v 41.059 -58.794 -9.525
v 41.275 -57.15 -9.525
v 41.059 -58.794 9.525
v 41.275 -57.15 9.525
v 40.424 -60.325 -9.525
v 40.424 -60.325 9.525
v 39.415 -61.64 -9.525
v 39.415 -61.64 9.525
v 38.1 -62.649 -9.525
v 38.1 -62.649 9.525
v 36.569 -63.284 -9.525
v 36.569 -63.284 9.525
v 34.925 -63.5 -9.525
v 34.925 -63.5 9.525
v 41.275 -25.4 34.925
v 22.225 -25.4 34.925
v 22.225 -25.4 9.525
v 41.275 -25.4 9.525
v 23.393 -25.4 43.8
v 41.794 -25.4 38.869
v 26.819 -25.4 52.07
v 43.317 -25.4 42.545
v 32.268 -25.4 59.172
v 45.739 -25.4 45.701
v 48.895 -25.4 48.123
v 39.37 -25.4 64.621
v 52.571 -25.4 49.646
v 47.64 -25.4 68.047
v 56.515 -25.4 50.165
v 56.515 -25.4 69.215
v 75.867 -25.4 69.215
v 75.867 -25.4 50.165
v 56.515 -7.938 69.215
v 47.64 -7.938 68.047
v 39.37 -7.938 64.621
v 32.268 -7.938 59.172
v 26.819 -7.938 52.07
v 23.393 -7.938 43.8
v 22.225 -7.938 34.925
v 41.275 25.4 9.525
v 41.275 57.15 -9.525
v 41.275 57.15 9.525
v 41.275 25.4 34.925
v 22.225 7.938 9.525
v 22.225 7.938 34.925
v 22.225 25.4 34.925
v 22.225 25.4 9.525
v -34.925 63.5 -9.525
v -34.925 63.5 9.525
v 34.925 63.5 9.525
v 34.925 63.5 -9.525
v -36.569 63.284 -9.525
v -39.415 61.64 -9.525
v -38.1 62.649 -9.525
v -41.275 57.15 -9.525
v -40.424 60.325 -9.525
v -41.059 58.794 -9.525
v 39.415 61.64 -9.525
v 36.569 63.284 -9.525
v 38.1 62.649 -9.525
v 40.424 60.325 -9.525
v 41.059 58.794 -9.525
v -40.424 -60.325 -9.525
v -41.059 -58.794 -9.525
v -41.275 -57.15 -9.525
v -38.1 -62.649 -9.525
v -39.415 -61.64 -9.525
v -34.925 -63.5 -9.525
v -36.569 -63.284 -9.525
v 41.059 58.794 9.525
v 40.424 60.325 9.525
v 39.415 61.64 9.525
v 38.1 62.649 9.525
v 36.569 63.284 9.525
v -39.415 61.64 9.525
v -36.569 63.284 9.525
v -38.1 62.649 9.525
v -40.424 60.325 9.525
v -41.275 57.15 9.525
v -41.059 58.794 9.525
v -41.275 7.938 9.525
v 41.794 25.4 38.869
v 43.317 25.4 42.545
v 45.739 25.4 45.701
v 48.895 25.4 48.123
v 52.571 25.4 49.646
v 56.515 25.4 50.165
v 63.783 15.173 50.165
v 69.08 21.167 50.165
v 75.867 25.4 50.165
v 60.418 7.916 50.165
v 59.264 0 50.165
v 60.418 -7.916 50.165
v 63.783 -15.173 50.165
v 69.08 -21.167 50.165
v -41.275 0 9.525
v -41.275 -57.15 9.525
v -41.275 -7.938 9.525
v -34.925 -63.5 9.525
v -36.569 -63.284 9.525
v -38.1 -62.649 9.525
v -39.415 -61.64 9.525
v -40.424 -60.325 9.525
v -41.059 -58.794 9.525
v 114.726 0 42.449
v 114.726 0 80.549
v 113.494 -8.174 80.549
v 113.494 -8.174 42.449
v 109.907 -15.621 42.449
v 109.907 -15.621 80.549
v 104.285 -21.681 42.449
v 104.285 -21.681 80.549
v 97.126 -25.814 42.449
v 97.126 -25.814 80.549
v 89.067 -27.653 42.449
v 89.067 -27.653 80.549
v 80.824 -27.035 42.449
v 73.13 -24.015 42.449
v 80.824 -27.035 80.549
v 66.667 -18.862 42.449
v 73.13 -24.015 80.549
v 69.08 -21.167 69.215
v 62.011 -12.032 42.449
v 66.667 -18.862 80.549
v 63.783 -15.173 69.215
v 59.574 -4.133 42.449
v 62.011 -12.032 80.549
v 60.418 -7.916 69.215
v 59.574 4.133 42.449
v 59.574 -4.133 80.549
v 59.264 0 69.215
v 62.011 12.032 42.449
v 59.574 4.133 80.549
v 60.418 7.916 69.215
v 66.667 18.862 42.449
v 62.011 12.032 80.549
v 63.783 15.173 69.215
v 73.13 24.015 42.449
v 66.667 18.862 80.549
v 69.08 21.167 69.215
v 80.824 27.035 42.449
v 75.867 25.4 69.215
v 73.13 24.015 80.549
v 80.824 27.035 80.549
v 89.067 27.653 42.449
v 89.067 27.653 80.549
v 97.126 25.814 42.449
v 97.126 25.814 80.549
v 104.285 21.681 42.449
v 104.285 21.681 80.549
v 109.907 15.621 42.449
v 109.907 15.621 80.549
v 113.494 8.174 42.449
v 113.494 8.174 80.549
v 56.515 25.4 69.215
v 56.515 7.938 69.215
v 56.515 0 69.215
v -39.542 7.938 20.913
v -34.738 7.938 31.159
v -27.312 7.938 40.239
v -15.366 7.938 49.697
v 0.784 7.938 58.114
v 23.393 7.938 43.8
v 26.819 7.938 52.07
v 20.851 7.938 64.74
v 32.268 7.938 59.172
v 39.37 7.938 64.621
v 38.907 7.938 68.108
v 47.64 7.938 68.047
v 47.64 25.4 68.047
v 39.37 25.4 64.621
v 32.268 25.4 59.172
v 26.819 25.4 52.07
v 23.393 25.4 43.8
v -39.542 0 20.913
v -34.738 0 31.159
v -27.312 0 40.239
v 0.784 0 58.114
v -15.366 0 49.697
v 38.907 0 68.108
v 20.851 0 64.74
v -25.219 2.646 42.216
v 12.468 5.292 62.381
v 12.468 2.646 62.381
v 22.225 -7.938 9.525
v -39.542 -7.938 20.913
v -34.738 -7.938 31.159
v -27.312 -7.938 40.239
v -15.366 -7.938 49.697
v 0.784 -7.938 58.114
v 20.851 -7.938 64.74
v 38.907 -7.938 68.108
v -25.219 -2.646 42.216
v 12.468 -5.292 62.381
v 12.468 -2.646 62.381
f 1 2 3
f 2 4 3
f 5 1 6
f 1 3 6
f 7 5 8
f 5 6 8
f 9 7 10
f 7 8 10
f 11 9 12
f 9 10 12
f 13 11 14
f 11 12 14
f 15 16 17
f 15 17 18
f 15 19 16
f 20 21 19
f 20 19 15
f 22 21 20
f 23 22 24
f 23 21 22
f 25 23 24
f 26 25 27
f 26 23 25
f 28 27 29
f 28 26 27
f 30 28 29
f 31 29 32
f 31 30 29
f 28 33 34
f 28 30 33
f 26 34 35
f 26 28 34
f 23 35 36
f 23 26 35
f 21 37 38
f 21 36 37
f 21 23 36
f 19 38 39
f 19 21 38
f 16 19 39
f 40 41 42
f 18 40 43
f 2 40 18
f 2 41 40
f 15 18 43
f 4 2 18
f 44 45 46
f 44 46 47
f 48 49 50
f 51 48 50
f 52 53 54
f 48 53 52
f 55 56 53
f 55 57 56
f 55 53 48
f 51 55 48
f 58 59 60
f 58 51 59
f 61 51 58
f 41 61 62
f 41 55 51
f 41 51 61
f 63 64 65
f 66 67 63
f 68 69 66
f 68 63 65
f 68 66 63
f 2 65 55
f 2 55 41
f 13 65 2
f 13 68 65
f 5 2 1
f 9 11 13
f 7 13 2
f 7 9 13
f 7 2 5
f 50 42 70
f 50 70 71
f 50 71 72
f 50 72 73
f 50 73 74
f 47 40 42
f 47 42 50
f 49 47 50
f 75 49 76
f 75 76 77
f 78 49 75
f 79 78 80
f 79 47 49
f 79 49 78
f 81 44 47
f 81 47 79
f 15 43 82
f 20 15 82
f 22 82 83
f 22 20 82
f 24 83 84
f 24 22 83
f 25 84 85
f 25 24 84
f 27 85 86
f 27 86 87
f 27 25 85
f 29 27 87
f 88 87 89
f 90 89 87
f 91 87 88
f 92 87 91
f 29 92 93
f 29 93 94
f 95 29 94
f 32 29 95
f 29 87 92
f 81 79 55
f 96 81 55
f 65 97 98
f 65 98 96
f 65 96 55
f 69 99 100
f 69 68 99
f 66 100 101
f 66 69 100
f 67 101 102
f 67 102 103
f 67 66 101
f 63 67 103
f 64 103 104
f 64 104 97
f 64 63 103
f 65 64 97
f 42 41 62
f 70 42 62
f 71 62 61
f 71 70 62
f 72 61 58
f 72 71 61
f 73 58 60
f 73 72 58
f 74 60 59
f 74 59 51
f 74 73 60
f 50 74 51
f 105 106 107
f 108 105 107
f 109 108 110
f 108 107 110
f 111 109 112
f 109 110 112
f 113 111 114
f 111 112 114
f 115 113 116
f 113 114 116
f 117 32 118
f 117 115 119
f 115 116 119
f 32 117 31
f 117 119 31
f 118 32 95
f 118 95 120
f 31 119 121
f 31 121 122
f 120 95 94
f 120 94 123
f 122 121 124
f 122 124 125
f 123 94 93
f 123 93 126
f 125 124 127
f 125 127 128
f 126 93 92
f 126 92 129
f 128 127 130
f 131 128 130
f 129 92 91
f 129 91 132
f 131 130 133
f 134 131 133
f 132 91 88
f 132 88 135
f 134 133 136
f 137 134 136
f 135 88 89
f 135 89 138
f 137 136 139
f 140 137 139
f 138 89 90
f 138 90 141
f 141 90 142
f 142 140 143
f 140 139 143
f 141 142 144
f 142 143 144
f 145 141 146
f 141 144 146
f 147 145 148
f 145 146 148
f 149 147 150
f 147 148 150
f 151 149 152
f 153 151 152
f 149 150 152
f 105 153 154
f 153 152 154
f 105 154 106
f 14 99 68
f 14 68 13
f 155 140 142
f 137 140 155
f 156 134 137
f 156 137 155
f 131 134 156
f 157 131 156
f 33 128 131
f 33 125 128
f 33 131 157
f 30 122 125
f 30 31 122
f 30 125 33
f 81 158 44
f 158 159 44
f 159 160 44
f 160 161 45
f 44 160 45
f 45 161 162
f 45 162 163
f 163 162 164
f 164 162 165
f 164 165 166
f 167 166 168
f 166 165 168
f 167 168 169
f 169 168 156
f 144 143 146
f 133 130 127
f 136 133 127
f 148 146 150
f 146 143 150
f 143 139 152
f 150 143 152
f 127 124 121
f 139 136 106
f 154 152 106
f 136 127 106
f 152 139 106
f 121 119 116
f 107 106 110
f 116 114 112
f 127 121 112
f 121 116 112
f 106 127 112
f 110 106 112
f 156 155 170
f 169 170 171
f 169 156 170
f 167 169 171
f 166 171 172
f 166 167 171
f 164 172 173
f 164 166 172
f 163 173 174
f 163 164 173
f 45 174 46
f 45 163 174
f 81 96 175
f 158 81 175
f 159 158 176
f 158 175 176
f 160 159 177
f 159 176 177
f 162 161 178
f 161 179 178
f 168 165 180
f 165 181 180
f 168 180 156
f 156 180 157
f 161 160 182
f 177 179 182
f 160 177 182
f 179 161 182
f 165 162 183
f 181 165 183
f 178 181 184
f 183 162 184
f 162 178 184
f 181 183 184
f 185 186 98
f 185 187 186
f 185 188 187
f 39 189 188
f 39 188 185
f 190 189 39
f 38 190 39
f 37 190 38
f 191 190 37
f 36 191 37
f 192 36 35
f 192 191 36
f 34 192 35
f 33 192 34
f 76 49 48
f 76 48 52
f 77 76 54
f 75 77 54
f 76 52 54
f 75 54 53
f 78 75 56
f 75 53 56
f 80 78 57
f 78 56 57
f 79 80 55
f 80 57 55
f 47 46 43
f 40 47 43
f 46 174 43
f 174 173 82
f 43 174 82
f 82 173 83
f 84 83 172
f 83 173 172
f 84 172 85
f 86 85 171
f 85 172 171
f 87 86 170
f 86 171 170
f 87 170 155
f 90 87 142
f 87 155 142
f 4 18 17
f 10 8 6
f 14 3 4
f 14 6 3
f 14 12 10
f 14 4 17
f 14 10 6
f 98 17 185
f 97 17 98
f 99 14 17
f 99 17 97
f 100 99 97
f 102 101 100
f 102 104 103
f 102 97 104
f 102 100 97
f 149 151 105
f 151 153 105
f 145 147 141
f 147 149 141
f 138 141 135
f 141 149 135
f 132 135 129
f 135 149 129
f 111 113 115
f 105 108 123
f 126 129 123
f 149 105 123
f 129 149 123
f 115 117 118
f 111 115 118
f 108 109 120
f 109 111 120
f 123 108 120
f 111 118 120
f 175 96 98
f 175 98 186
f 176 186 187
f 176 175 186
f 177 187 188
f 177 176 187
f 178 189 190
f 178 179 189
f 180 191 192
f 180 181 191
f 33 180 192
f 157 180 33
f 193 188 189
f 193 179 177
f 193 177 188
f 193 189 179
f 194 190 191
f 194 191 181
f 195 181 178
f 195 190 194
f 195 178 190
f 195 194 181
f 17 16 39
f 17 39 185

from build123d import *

# Parameters (mm, degrees)
F1_DEPTH = 63.5
F2_DEPTH = 25.4
F3_DEPTH = 7.9375
F5_R     = 6.35


with BuildPart() as f1:
    # F0 (on Front) → F1 (new body, symmetric)
    with BuildSketch(Plane.XZ):
        Polygon((41.275, -9.525), (41.275, 9.525), (22.225, 9.525), (-41.275, 9.525), (-41.275, -9.525), align=None)
    extrude(amount=F1_DEPTH, both=True)

    # F0 (on Front) → F2 (join, symmetric)
    with BuildSketch(Plane.XZ):
        with BuildLine():
            Line((22.225, 9.525), (41.275, 9.525))
            Line((41.275, 9.525), (41.275, 34.925))
            ThreePointArc((41.275, 34.925), (45.738693, 45.701307), (56.515, 50.165))
            Line((56.515, 50.165), (76.625528, 50.165))
            Line((76.625528, 50.165), (76.625528, 69.215))
            Line((76.625528, 69.215), (56.515, 69.215))
            ThreePointArc((56.515, 69.215), (32.268308, 59.171692), (22.225, 34.925))
            Line((22.225, 34.925), (22.225, 9.525))
        make_face()
    extrude(amount=F2_DEPTH, both=True)

    # F0 (on Front) → F3 (join, symmetric)
    with BuildSketch(Plane.XZ):
        with BuildLine():
            Line((-41.275, 9.525), (22.225, 9.525))
            Line((22.225, 9.525), (22.225, 34.925))
            ThreePointArc((22.225, 34.925), (32.268308, 59.171692), (56.515, 69.215))
            add(Edge.make_bspline(
                [(-41.275, 9.525), (-41.123904, 48.20979), (14.377582, 69.315985), (56.515, 69.215)],
                knots=[0, 0, 0, 0, 114.567797, 114.567797, 114.567797, 114.567797], degree=3))
        make_face()
    extrude(amount=F3_DEPTH, both=True)

    # F0 (on Front) → F4 (revolve)
    with BuildSketch(Plane.XZ):
        Polygon((86.995, 69.215), (86.995, 50.165), (86.995, 42.44888), (114.725528, 42.44888), (114.725528, 80.54888), (86.995, 80.54888), align=None)
    revolve(axis=Axis((86.995, 0, 61.49888), (0, 0, -1)))

    # F5
    f5_edges = [f1.edges().sort_by_distance(p)[0] for p in [
        (-41.275, 63.5, 0),
        (-41.275, -63.5, 0),
        (41.275, 63.5, 0),
        (41.275, -63.5, 0),
    ]]
    fillet(f5_edges, radius=F5_R)


solid = f1.part
